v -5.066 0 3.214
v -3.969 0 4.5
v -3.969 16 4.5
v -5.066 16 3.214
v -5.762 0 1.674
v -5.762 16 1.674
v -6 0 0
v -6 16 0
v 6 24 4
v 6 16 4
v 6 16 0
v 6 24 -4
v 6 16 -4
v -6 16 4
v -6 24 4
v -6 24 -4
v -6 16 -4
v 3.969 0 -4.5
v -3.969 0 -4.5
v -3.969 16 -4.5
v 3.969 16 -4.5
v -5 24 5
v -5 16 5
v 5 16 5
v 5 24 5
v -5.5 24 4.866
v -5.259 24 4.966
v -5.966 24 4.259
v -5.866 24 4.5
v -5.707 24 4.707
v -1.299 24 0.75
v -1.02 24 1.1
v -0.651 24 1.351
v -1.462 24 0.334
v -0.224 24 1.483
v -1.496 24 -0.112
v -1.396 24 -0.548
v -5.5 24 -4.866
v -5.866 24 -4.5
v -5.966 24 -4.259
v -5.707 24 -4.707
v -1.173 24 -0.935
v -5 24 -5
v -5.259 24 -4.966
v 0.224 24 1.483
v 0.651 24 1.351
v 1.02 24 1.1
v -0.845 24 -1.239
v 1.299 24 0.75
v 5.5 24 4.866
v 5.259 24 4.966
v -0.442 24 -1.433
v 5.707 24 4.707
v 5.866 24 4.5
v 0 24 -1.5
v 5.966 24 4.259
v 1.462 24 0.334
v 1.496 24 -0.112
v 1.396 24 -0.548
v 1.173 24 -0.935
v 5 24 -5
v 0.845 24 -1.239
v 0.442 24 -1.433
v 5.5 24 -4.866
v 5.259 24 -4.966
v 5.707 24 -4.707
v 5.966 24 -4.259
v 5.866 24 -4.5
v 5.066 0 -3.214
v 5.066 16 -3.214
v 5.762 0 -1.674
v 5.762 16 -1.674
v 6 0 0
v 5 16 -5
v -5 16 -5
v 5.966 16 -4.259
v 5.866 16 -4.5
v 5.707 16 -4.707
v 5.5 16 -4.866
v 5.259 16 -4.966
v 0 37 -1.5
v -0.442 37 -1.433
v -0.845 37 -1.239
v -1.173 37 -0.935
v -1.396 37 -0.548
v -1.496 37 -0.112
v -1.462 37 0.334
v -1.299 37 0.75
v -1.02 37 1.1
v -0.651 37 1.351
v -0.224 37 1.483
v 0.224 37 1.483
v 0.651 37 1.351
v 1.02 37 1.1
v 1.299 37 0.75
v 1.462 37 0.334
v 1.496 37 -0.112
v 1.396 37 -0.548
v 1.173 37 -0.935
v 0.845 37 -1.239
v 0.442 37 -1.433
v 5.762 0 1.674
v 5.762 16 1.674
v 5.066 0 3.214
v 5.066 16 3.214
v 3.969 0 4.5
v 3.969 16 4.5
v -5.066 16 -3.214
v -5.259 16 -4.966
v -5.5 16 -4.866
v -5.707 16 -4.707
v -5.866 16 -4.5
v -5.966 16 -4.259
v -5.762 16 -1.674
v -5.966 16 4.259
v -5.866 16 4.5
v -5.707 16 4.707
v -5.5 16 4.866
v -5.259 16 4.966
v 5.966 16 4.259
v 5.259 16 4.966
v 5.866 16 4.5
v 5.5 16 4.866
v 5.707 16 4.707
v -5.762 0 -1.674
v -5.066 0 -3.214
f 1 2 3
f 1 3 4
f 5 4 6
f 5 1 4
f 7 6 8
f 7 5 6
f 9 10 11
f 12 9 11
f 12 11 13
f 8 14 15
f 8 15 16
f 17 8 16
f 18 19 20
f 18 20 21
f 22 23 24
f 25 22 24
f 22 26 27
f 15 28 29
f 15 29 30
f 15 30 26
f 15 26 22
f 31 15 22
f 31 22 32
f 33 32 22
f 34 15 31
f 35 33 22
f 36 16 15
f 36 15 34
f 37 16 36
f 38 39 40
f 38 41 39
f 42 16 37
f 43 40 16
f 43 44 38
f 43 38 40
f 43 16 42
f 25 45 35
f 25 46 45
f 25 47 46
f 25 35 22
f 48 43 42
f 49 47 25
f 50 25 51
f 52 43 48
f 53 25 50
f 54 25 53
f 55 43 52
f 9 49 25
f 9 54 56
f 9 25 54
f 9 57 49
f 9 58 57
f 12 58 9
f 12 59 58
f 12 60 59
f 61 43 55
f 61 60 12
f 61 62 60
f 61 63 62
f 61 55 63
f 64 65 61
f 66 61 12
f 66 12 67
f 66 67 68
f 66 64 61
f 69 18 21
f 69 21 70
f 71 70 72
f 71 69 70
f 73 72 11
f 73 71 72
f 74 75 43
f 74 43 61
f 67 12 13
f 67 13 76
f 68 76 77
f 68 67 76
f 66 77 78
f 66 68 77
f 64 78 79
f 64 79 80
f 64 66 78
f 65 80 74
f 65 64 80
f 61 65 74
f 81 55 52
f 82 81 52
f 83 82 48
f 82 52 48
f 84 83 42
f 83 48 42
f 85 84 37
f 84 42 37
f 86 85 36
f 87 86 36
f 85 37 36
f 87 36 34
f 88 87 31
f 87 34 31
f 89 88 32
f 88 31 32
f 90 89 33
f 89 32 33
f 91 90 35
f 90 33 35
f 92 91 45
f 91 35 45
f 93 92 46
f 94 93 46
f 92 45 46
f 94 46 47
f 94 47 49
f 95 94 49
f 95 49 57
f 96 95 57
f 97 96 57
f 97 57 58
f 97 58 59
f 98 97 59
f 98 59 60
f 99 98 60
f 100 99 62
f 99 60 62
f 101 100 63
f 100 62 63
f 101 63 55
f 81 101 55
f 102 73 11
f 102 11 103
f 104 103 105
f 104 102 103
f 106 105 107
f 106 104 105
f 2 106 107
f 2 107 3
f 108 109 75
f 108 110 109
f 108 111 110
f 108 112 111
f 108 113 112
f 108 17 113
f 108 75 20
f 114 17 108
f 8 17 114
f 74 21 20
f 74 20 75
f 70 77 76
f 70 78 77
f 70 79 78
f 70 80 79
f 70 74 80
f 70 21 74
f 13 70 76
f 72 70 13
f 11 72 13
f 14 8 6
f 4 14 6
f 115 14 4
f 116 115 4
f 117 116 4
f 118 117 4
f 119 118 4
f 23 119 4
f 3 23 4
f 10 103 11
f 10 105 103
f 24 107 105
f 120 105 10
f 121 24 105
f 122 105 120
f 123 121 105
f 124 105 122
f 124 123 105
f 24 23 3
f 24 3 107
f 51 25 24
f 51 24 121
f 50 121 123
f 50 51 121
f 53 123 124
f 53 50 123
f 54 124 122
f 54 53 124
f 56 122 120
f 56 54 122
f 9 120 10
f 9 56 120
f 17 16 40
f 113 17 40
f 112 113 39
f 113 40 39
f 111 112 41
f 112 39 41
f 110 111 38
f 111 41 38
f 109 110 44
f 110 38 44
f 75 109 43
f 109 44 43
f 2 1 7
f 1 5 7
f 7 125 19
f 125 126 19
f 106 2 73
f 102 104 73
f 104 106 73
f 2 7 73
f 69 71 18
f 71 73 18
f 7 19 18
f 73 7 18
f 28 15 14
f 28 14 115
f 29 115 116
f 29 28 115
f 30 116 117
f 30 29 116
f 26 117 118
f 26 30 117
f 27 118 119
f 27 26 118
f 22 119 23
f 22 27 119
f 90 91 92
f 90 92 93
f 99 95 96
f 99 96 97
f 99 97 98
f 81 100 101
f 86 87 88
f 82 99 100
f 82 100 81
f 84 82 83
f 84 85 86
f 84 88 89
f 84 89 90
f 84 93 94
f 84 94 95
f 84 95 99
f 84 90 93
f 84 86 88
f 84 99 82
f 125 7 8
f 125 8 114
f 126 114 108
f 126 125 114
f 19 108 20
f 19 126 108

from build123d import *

# Parameters (mm, degrees)
SKETCH_1_W          = 12
SKETCH_1_H          = 10
EXTRUDE_1_DEPTH     = 24
FILLET_1_R          = 1
SKETCH_2_OUTSIDE_W  = 19.728
SKETCH_2_OUTSIDE_H  = 17.728
CUT_EXTRUDE_1_DEPTH = 16
SKETCH_3_R          = 1.5
EXTRUDE_2_DEPTH     = 13


with BuildPart() as part:
    # 草图1 → 凸台-拉伸1 (new body)
    with BuildSketch(Plane(origin=(0, 0, 0), x_dir=(1, 0, 0), z_dir=(0, 1, 0))):
        Rectangle(SKETCH_1_W, SKETCH_1_H)
    extrude(amount=EXTRUDE_1_DEPTH)

    # 圆角1
    fillet_1_edges = [part.edges().sort_by_distance(p)[0] for p in [
        (6, 12, 5),
        (-6, 12, 5),
        (-6, 12, -5),
        (6, 12, -5),
    ]]
    fillet(fillet_1_edges, radius=FILLET_1_R)

    # 草图2 outside → 切除-拉伸1 (cut)
    with BuildSketch(Plane.XZ):
        Rectangle(SKETCH_2_OUTSIDE_W, SKETCH_2_OUTSIDE_H)
        with BuildLine():
            Line((-3.968626967, -4.5), (3.968626967, -4.5))
            ThreePointArc((3.968626967, -4.5), (5.468626967, -2.468626967), (6, 0))
            ThreePointArc((6, 0), (5.468626967, 2.468626967), (3.968626967, 4.5))
            Line((3.968626967, 4.5), (-3.968626967, 4.5))
            ThreePointArc((-3.968626967, 4.5), (-5.468626967, 2.468626967), (-6, 0))
            ThreePointArc((-6, 0), (-5.468626967, -2.468626967), (-3.968626967, -4.5))
        make_face(mode=Mode.SUBTRACT)
    extrude(amount=-CUT_EXTRUDE_1_DEPTH, mode=Mode.SUBTRACT)

    # 草图3 → 凸台-拉伸2 (add)
    with BuildSketch(Plane(origin=(0, 24, 0), x_dir=(1, 0, 0), z_dir=(0, 1, 0))):
        with Locations(Location((0, 0, 0), (0, 0, 90))):
            Circle(SKETCH_3_R)
    extrude(amount=EXTRUDE_2_DEPTH)


solid = part.part
